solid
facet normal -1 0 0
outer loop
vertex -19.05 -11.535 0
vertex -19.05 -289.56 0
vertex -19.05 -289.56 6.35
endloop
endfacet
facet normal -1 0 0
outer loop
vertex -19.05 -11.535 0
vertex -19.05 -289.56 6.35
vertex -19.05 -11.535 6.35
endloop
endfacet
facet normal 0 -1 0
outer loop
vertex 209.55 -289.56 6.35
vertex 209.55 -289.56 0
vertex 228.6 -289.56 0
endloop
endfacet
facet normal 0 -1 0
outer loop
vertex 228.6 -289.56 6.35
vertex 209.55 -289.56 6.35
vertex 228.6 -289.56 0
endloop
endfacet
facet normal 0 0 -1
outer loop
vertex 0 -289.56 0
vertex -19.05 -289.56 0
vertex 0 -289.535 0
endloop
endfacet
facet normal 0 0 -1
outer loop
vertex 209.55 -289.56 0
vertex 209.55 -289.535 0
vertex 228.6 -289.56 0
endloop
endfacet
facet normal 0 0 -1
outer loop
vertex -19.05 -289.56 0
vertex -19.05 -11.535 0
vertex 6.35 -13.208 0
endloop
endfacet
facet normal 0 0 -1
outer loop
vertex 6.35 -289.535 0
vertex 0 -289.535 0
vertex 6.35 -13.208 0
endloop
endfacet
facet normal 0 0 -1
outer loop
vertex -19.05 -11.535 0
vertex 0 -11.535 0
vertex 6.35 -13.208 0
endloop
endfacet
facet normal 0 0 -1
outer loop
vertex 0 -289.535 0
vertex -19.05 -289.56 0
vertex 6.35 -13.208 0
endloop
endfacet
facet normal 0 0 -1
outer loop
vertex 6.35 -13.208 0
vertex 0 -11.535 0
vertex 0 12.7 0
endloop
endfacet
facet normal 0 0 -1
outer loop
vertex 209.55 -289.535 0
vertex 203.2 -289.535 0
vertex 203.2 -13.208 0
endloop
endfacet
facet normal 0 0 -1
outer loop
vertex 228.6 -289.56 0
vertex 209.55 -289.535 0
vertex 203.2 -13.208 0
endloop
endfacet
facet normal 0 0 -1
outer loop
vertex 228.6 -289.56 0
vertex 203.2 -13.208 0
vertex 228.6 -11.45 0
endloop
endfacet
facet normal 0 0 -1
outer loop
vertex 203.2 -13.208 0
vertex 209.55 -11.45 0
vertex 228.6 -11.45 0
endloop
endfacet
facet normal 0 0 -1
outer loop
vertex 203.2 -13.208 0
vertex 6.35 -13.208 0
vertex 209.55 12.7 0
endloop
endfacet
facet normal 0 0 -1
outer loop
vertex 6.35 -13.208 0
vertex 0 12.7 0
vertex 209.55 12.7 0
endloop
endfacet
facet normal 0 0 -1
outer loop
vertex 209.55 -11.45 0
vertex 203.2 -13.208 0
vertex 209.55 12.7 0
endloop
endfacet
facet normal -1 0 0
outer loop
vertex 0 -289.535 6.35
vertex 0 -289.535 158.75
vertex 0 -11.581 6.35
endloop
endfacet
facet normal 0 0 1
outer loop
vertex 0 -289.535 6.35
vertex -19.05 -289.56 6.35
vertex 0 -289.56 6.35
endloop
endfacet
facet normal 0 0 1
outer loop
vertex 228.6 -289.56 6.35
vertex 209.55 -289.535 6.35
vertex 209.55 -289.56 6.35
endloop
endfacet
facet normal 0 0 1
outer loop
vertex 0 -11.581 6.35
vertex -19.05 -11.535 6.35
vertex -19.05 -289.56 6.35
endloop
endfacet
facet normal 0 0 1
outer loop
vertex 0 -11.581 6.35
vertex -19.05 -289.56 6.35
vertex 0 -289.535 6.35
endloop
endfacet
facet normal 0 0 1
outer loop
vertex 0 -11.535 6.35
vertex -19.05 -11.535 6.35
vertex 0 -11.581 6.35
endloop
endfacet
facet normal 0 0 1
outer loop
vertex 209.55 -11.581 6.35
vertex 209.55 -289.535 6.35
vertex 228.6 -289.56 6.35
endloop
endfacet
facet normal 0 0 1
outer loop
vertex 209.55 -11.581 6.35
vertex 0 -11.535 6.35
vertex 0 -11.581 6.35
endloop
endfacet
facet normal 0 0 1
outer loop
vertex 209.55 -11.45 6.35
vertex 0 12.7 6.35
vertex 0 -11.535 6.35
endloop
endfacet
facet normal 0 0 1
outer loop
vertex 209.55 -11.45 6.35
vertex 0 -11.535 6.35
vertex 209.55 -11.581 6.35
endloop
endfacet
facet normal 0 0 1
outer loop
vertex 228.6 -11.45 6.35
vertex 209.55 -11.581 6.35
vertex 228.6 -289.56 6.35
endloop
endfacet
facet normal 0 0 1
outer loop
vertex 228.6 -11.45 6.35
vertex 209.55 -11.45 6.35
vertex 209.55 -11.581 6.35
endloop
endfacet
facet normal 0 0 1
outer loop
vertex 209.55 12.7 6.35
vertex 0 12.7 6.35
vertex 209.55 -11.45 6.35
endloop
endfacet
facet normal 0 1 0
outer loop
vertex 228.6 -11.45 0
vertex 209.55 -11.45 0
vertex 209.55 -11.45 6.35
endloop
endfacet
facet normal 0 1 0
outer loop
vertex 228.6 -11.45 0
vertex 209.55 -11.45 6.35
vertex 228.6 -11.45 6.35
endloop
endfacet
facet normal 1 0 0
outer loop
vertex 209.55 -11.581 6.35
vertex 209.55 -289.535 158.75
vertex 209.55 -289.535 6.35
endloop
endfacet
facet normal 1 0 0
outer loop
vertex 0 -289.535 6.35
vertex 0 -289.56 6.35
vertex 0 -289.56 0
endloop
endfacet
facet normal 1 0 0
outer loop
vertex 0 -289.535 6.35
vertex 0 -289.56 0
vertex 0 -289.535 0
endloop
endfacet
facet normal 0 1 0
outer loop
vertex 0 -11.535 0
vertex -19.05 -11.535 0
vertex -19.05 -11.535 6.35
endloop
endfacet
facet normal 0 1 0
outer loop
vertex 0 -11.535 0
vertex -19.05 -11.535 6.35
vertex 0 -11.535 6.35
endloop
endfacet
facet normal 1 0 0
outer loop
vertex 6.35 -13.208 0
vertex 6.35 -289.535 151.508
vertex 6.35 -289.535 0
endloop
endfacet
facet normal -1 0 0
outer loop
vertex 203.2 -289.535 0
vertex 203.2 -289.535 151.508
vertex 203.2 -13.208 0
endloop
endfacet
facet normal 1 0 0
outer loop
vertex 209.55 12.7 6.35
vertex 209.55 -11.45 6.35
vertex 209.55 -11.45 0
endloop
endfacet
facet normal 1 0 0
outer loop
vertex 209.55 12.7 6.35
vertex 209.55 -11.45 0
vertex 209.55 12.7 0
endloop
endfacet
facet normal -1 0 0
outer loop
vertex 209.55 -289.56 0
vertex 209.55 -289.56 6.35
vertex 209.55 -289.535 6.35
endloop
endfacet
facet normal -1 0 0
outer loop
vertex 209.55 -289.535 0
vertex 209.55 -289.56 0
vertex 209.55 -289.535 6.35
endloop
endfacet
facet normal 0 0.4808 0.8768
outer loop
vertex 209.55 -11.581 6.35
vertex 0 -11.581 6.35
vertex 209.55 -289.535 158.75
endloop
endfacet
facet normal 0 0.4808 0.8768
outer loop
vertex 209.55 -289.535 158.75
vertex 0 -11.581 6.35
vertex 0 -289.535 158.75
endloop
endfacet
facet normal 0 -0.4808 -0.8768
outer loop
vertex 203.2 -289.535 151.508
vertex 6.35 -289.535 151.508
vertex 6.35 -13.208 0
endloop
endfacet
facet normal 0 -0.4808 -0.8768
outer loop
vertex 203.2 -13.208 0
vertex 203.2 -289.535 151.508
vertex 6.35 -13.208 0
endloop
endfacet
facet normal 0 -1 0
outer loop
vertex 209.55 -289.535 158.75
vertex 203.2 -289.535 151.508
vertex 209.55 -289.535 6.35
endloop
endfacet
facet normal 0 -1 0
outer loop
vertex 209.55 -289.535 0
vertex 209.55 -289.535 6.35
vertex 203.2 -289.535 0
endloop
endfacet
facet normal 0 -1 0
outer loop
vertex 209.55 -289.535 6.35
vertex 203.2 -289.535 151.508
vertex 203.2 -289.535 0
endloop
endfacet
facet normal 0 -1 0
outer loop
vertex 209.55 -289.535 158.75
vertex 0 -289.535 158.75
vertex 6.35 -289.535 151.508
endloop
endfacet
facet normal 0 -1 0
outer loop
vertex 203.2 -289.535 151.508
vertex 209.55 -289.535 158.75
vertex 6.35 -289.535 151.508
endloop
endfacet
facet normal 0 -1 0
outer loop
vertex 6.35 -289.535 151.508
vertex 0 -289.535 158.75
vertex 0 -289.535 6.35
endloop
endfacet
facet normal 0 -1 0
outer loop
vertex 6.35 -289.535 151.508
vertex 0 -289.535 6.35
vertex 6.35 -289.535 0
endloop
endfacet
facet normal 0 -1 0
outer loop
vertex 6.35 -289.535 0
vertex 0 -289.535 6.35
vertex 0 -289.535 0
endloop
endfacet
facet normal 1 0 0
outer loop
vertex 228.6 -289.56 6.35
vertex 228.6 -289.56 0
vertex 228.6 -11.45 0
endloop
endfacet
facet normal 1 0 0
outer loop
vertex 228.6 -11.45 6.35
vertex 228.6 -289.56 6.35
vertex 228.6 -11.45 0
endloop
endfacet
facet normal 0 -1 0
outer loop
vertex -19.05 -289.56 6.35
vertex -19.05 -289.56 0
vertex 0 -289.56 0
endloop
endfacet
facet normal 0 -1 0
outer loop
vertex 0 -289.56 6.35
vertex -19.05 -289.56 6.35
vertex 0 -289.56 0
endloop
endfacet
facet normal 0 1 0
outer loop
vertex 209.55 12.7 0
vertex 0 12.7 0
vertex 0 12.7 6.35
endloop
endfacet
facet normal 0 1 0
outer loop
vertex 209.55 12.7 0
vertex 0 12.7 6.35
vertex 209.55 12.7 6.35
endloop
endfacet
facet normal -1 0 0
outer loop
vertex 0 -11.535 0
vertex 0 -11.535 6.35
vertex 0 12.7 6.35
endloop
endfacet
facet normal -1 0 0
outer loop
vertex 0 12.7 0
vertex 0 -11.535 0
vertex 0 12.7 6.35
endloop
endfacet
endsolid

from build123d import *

# Parameters (mm, degrees)
F1_DEPTH = 203.2
F2_DEPTH = 6.35
F4_DEPTH = 6.35
F5_W     = 19.05
F5_H     = 278.024951
F5_W_2   = 209.55
F5_H_2   = 12.7
F5_H_3   = 278.110252
F6_DEPTH = 6.35


with BuildPart() as f1:
    # F0 (on Right) → F1 (new body)
    with BuildSketch(Plane.YZ):
        Polygon((0, 6.35), (-11.581397, 6.35), (-289.534933, 158.75), (-289.534933, 151.508147), (-13.207997, 0), (0, 0), align=None)
    extrude(amount=F1_DEPTH)

    # F0 (on Right) → F2 (join)
    with BuildSketch(Plane.YZ):
        Polygon((-13.207997, 0), (-289.534933, 151.508147), (-289.534933, 0), align=None)
    extrude(amount=F2_DEPTH)

    # F3 (on face) → F4 (join)
    with BuildSketch(Plane.YZ.offset(203.2)):
        Polygon((-11.581397, 6.35), (-289.534933, 158.75), (-289.534933, 0), (0, 0), (0, 6.35), align=None)
    extrude(amount=F4_DEPTH)

    # F5 (on Top) → F6 (join)
    with BuildSketch(Plane.XY):
        with Locations((-9.525, -150.547525)):
            Rectangle(F5_W, F5_H)
        with Locations((104.775, 6.35)):
            Rectangle(F5_W_2, F5_H_2)
        with Locations((219.075, -150.504874)):
            Rectangle(F5_W, F5_H_3)
    extrude(amount=F6_DEPTH)


solid = f1.part
